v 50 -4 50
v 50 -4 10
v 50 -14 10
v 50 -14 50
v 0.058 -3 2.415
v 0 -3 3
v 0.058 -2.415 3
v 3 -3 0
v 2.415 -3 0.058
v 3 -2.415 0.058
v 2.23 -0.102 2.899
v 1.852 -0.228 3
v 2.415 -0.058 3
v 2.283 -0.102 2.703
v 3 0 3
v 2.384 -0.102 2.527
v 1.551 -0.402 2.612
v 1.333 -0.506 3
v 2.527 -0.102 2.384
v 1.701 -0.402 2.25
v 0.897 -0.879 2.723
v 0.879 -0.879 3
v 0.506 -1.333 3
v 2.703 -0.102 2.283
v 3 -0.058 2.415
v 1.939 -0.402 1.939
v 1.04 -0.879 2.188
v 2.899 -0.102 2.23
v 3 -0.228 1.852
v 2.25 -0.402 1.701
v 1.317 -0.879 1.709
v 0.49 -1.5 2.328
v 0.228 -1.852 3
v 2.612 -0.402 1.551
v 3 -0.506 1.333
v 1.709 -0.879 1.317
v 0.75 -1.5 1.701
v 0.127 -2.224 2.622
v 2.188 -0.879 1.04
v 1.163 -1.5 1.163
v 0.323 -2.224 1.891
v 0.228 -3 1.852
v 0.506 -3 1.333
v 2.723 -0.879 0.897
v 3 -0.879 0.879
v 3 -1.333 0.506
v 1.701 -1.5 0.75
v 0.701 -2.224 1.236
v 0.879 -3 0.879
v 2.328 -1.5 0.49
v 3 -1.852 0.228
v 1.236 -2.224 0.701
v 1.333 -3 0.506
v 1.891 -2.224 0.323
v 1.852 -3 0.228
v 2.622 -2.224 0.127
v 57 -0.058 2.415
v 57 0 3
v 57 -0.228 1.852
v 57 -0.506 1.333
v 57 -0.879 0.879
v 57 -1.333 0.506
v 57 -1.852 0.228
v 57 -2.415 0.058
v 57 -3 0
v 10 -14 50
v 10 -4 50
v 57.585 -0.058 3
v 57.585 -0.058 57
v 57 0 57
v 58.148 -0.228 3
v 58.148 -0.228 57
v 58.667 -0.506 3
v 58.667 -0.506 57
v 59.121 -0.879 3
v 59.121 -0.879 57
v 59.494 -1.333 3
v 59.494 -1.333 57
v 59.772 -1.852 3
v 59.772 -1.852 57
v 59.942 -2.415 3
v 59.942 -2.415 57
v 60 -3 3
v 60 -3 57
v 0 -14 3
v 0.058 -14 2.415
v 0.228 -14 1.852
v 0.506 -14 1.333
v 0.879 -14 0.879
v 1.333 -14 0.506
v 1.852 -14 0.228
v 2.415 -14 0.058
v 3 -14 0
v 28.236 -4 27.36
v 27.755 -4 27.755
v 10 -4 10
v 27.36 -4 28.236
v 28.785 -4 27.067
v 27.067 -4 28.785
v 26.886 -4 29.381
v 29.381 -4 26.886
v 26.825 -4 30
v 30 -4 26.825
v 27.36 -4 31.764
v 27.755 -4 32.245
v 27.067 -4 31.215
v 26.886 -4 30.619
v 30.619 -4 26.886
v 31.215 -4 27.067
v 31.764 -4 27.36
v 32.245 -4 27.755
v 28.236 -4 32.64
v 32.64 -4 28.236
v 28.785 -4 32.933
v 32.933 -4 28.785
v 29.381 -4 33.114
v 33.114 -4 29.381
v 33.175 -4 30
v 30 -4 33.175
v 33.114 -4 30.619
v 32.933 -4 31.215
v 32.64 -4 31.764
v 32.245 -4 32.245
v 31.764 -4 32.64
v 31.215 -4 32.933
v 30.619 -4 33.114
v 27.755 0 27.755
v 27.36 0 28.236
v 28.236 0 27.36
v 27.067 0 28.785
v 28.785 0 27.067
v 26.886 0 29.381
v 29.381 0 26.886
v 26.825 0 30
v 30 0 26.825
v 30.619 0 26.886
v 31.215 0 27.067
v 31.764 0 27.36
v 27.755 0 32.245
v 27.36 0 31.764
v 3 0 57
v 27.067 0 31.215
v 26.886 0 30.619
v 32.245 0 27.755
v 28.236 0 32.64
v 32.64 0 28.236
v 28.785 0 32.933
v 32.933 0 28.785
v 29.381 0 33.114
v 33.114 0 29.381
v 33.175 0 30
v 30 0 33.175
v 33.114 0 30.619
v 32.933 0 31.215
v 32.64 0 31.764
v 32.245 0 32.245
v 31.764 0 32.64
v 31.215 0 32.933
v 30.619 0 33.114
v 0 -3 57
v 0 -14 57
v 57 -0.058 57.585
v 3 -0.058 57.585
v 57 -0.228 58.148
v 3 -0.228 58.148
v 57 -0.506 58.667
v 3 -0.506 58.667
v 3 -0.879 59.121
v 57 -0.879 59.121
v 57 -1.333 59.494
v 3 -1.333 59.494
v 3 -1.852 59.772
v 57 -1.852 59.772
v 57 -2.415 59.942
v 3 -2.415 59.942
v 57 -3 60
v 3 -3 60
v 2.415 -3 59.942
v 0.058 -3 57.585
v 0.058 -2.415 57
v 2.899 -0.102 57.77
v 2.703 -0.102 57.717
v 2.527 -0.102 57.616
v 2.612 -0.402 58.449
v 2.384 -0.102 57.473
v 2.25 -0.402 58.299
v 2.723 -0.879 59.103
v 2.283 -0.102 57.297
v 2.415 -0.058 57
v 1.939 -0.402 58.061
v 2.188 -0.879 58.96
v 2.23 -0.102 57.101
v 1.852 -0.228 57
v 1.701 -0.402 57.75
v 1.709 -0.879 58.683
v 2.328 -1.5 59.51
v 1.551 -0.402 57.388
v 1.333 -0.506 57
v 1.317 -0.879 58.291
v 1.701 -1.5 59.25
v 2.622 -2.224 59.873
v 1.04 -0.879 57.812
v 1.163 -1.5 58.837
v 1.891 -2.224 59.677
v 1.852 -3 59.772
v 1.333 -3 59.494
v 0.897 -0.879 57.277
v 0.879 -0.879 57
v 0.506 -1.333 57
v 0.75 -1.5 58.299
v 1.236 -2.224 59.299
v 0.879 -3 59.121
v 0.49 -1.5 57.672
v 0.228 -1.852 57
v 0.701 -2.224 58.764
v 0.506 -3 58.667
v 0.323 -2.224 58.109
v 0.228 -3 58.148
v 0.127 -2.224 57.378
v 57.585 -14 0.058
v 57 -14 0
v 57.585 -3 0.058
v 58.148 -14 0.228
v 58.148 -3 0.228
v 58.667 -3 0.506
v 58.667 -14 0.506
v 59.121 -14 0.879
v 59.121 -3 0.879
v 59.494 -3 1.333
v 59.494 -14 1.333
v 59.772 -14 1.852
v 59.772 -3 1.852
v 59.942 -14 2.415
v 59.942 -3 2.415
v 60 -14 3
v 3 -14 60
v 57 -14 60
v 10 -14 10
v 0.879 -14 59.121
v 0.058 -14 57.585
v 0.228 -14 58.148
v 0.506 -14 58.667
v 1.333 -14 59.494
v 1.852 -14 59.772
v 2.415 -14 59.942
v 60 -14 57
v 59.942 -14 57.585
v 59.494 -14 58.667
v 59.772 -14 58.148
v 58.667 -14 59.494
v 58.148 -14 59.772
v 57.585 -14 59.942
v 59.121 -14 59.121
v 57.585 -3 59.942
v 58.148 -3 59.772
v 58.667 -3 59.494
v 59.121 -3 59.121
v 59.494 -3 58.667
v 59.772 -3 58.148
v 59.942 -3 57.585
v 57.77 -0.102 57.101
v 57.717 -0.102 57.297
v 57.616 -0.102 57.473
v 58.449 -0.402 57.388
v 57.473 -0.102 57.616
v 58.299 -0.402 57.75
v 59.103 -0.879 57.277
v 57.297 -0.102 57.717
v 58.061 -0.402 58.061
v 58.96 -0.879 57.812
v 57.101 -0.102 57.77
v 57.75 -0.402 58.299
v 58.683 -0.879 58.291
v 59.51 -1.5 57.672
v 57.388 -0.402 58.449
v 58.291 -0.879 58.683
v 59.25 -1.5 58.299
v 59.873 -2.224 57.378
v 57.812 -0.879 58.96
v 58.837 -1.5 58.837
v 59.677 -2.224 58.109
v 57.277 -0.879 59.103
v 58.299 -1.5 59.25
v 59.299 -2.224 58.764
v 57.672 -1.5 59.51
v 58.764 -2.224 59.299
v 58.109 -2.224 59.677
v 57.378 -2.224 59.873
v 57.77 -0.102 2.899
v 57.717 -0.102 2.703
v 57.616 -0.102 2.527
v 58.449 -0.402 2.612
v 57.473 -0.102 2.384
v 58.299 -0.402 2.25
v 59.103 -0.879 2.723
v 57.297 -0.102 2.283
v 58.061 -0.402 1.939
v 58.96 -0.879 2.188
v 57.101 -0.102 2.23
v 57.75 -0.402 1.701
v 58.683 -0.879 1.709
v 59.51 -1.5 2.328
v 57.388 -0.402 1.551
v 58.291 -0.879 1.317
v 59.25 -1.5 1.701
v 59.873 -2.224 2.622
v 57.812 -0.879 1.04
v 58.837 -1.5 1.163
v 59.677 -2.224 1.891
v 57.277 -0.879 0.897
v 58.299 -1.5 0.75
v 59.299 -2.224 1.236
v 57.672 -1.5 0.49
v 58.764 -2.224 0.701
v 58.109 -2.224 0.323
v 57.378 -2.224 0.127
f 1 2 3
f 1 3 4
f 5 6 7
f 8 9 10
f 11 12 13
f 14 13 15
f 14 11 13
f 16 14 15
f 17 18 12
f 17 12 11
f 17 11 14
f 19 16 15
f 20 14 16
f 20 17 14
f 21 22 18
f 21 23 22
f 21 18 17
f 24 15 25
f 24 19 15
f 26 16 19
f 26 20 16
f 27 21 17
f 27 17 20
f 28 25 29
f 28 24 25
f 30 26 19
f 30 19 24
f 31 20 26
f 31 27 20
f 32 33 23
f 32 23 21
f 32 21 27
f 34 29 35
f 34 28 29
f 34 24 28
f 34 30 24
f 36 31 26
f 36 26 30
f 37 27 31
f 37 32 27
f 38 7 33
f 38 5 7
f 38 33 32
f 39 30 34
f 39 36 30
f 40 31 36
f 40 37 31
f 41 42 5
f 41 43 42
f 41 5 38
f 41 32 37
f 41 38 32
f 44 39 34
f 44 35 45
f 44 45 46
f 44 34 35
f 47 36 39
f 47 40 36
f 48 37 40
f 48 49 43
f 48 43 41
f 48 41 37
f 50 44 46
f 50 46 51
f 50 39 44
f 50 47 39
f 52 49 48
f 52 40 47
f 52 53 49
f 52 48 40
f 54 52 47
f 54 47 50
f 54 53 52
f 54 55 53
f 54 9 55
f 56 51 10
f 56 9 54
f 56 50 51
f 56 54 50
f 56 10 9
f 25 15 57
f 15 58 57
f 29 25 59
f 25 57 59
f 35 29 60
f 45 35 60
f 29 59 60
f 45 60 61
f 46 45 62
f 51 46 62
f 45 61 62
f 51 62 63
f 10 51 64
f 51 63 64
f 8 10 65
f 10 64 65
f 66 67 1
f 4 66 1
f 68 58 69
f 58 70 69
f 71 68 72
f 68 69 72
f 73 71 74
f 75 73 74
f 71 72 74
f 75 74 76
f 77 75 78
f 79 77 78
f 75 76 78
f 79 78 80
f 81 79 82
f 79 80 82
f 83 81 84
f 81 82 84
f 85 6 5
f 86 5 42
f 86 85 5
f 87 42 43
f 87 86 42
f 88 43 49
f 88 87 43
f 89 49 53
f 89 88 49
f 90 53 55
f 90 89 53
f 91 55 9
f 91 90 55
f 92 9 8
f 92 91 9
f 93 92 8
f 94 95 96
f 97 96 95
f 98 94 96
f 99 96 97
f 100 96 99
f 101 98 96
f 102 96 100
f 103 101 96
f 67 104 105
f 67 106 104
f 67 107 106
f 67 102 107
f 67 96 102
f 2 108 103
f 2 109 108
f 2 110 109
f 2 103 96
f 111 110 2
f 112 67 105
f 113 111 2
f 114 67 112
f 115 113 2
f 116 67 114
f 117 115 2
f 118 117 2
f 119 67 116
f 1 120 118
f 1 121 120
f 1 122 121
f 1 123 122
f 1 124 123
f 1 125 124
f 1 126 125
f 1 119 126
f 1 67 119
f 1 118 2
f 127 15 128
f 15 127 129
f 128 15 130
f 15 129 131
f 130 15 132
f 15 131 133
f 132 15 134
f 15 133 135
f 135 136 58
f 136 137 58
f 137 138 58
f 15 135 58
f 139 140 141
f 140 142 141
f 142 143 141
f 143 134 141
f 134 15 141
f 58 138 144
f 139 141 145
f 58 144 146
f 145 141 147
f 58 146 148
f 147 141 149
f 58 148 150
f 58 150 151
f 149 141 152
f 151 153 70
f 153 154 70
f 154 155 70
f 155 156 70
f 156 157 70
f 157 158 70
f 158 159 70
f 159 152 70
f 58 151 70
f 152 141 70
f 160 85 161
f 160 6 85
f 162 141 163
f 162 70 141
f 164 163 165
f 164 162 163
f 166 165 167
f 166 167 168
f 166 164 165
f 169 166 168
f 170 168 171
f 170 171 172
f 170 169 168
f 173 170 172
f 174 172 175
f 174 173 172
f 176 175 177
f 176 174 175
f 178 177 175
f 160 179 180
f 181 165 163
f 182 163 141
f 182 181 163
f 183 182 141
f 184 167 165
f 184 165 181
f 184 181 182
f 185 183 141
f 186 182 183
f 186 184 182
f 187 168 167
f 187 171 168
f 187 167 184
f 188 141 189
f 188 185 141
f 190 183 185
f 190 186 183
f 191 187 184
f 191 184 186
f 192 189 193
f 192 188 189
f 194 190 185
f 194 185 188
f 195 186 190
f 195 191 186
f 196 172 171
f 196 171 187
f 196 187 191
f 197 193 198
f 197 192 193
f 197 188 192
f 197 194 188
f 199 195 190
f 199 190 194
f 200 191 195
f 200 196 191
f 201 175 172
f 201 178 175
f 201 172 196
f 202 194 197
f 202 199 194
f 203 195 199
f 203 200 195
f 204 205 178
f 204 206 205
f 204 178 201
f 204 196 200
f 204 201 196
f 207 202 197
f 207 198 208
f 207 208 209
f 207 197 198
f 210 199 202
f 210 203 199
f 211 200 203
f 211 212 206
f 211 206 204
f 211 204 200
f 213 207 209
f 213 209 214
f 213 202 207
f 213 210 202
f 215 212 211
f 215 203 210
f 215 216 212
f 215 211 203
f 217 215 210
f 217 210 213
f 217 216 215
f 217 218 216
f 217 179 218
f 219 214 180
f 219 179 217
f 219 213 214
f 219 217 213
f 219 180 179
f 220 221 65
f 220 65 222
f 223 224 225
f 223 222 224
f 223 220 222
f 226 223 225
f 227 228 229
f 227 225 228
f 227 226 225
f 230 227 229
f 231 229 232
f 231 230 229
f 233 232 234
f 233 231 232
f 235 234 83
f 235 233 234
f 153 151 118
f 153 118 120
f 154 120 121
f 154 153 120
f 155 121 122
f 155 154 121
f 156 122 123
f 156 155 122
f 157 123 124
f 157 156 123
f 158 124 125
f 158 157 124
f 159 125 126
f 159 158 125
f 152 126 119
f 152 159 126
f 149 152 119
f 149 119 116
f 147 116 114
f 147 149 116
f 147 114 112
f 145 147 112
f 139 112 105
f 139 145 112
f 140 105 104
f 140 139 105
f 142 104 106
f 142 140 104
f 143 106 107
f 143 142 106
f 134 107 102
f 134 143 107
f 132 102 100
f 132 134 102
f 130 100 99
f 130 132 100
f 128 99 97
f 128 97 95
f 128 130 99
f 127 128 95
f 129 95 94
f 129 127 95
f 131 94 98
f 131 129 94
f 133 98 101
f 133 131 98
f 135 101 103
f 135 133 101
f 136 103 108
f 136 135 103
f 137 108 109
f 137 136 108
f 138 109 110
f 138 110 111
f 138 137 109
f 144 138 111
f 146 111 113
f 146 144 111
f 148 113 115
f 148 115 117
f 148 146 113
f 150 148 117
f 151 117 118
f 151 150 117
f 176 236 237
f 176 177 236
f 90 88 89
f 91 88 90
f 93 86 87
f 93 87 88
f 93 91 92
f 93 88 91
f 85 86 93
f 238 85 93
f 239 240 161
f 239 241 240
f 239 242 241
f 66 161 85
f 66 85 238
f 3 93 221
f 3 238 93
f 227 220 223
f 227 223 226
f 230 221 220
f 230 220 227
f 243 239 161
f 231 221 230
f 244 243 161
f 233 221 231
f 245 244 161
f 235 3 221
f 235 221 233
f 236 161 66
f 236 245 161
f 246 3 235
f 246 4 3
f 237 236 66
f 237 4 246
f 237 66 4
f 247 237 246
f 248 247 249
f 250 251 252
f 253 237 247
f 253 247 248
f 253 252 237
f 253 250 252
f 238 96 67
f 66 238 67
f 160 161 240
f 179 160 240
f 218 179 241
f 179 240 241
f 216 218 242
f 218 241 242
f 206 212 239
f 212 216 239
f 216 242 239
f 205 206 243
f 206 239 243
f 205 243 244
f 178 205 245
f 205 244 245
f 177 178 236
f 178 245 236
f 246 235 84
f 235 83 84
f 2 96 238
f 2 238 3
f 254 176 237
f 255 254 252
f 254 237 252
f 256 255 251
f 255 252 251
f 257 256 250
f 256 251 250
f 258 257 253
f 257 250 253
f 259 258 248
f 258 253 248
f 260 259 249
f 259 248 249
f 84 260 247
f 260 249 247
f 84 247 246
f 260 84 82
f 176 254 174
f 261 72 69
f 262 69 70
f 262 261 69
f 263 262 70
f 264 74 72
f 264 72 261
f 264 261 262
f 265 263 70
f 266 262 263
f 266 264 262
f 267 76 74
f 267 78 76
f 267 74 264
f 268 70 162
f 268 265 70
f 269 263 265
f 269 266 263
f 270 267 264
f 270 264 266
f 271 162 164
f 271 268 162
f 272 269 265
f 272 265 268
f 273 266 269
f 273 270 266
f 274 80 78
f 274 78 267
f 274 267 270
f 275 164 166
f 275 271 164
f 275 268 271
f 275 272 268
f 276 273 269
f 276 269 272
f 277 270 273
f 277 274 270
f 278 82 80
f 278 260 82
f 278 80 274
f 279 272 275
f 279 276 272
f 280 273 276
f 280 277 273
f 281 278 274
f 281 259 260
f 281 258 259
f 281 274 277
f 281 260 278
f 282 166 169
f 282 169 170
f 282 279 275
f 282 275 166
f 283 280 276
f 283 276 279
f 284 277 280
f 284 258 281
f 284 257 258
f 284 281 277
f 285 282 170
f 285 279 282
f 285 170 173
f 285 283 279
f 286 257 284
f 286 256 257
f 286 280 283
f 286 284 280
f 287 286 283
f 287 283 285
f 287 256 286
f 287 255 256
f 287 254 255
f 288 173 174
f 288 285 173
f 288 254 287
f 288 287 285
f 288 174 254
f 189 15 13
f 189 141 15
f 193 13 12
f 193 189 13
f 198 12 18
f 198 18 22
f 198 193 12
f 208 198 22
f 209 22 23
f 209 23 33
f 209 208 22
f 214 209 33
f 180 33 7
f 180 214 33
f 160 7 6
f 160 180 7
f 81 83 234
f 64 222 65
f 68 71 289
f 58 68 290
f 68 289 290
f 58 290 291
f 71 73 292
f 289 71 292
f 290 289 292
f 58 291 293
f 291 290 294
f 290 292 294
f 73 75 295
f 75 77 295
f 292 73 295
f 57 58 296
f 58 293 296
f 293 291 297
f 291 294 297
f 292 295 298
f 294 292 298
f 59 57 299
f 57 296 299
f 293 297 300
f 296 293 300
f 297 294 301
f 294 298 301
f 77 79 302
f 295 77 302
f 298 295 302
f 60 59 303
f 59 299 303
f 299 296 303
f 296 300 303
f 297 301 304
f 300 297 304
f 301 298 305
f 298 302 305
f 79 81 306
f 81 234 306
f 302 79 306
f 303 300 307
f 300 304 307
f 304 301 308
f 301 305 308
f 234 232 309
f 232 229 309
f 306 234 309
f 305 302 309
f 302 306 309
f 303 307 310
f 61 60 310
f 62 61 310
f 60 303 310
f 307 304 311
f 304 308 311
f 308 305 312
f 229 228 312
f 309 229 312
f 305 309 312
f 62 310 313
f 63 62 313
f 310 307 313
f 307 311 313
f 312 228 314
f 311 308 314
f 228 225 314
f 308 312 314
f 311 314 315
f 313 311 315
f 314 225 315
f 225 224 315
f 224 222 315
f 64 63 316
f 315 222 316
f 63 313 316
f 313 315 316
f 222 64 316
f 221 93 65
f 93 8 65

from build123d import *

# Parameters (mm, degrees)
F0_W     = 60
F0_H     = 60
F0_W_2   = 40
F0_H_2   = 40
F1_DEPTH = 14
F0_R     = 3.175
F2_DEPTH = 4
F3_R     = 3


# Not quite as in the source:
# - a feature names something its author has since deleted; it is built from what else it names


with BuildPart() as f1:
    # F0 (on Front) → F1 (new body)
    with BuildSketch(Plane.XZ):
        with Locations((30, 30)):
            Rectangle(F0_W, F0_H)
        with Locations((30, 30)):
            Rectangle(F0_W_2, F0_H_2, mode=Mode.SUBTRACT)
    extrude(amount=F1_DEPTH)

    # F0 (on Front) → F2 (join)
    with BuildSketch(Plane.XZ):
        with Locations((30, 30)):
            Rectangle(F0_W_2, F0_H_2)
        with Locations((30, 30)):
            Circle(F0_R, mode=Mode.SUBTRACT)
    extrude(amount=F2_DEPTH)

    # F3
    f3_edges = [f1.edges().sort_by_distance(p)[0] for p in [
        (0, -7, 0),
        (0, -7, 60),
        (60, -7, 60),
        (60, -7, 0),
        (60, 0, 30),
        (30, 0, 60),
        (0, 0, 30),
        (30, 0, 0),
    ]]
    fillet(f3_edges, radius=F3_R)


solid = f1.part
